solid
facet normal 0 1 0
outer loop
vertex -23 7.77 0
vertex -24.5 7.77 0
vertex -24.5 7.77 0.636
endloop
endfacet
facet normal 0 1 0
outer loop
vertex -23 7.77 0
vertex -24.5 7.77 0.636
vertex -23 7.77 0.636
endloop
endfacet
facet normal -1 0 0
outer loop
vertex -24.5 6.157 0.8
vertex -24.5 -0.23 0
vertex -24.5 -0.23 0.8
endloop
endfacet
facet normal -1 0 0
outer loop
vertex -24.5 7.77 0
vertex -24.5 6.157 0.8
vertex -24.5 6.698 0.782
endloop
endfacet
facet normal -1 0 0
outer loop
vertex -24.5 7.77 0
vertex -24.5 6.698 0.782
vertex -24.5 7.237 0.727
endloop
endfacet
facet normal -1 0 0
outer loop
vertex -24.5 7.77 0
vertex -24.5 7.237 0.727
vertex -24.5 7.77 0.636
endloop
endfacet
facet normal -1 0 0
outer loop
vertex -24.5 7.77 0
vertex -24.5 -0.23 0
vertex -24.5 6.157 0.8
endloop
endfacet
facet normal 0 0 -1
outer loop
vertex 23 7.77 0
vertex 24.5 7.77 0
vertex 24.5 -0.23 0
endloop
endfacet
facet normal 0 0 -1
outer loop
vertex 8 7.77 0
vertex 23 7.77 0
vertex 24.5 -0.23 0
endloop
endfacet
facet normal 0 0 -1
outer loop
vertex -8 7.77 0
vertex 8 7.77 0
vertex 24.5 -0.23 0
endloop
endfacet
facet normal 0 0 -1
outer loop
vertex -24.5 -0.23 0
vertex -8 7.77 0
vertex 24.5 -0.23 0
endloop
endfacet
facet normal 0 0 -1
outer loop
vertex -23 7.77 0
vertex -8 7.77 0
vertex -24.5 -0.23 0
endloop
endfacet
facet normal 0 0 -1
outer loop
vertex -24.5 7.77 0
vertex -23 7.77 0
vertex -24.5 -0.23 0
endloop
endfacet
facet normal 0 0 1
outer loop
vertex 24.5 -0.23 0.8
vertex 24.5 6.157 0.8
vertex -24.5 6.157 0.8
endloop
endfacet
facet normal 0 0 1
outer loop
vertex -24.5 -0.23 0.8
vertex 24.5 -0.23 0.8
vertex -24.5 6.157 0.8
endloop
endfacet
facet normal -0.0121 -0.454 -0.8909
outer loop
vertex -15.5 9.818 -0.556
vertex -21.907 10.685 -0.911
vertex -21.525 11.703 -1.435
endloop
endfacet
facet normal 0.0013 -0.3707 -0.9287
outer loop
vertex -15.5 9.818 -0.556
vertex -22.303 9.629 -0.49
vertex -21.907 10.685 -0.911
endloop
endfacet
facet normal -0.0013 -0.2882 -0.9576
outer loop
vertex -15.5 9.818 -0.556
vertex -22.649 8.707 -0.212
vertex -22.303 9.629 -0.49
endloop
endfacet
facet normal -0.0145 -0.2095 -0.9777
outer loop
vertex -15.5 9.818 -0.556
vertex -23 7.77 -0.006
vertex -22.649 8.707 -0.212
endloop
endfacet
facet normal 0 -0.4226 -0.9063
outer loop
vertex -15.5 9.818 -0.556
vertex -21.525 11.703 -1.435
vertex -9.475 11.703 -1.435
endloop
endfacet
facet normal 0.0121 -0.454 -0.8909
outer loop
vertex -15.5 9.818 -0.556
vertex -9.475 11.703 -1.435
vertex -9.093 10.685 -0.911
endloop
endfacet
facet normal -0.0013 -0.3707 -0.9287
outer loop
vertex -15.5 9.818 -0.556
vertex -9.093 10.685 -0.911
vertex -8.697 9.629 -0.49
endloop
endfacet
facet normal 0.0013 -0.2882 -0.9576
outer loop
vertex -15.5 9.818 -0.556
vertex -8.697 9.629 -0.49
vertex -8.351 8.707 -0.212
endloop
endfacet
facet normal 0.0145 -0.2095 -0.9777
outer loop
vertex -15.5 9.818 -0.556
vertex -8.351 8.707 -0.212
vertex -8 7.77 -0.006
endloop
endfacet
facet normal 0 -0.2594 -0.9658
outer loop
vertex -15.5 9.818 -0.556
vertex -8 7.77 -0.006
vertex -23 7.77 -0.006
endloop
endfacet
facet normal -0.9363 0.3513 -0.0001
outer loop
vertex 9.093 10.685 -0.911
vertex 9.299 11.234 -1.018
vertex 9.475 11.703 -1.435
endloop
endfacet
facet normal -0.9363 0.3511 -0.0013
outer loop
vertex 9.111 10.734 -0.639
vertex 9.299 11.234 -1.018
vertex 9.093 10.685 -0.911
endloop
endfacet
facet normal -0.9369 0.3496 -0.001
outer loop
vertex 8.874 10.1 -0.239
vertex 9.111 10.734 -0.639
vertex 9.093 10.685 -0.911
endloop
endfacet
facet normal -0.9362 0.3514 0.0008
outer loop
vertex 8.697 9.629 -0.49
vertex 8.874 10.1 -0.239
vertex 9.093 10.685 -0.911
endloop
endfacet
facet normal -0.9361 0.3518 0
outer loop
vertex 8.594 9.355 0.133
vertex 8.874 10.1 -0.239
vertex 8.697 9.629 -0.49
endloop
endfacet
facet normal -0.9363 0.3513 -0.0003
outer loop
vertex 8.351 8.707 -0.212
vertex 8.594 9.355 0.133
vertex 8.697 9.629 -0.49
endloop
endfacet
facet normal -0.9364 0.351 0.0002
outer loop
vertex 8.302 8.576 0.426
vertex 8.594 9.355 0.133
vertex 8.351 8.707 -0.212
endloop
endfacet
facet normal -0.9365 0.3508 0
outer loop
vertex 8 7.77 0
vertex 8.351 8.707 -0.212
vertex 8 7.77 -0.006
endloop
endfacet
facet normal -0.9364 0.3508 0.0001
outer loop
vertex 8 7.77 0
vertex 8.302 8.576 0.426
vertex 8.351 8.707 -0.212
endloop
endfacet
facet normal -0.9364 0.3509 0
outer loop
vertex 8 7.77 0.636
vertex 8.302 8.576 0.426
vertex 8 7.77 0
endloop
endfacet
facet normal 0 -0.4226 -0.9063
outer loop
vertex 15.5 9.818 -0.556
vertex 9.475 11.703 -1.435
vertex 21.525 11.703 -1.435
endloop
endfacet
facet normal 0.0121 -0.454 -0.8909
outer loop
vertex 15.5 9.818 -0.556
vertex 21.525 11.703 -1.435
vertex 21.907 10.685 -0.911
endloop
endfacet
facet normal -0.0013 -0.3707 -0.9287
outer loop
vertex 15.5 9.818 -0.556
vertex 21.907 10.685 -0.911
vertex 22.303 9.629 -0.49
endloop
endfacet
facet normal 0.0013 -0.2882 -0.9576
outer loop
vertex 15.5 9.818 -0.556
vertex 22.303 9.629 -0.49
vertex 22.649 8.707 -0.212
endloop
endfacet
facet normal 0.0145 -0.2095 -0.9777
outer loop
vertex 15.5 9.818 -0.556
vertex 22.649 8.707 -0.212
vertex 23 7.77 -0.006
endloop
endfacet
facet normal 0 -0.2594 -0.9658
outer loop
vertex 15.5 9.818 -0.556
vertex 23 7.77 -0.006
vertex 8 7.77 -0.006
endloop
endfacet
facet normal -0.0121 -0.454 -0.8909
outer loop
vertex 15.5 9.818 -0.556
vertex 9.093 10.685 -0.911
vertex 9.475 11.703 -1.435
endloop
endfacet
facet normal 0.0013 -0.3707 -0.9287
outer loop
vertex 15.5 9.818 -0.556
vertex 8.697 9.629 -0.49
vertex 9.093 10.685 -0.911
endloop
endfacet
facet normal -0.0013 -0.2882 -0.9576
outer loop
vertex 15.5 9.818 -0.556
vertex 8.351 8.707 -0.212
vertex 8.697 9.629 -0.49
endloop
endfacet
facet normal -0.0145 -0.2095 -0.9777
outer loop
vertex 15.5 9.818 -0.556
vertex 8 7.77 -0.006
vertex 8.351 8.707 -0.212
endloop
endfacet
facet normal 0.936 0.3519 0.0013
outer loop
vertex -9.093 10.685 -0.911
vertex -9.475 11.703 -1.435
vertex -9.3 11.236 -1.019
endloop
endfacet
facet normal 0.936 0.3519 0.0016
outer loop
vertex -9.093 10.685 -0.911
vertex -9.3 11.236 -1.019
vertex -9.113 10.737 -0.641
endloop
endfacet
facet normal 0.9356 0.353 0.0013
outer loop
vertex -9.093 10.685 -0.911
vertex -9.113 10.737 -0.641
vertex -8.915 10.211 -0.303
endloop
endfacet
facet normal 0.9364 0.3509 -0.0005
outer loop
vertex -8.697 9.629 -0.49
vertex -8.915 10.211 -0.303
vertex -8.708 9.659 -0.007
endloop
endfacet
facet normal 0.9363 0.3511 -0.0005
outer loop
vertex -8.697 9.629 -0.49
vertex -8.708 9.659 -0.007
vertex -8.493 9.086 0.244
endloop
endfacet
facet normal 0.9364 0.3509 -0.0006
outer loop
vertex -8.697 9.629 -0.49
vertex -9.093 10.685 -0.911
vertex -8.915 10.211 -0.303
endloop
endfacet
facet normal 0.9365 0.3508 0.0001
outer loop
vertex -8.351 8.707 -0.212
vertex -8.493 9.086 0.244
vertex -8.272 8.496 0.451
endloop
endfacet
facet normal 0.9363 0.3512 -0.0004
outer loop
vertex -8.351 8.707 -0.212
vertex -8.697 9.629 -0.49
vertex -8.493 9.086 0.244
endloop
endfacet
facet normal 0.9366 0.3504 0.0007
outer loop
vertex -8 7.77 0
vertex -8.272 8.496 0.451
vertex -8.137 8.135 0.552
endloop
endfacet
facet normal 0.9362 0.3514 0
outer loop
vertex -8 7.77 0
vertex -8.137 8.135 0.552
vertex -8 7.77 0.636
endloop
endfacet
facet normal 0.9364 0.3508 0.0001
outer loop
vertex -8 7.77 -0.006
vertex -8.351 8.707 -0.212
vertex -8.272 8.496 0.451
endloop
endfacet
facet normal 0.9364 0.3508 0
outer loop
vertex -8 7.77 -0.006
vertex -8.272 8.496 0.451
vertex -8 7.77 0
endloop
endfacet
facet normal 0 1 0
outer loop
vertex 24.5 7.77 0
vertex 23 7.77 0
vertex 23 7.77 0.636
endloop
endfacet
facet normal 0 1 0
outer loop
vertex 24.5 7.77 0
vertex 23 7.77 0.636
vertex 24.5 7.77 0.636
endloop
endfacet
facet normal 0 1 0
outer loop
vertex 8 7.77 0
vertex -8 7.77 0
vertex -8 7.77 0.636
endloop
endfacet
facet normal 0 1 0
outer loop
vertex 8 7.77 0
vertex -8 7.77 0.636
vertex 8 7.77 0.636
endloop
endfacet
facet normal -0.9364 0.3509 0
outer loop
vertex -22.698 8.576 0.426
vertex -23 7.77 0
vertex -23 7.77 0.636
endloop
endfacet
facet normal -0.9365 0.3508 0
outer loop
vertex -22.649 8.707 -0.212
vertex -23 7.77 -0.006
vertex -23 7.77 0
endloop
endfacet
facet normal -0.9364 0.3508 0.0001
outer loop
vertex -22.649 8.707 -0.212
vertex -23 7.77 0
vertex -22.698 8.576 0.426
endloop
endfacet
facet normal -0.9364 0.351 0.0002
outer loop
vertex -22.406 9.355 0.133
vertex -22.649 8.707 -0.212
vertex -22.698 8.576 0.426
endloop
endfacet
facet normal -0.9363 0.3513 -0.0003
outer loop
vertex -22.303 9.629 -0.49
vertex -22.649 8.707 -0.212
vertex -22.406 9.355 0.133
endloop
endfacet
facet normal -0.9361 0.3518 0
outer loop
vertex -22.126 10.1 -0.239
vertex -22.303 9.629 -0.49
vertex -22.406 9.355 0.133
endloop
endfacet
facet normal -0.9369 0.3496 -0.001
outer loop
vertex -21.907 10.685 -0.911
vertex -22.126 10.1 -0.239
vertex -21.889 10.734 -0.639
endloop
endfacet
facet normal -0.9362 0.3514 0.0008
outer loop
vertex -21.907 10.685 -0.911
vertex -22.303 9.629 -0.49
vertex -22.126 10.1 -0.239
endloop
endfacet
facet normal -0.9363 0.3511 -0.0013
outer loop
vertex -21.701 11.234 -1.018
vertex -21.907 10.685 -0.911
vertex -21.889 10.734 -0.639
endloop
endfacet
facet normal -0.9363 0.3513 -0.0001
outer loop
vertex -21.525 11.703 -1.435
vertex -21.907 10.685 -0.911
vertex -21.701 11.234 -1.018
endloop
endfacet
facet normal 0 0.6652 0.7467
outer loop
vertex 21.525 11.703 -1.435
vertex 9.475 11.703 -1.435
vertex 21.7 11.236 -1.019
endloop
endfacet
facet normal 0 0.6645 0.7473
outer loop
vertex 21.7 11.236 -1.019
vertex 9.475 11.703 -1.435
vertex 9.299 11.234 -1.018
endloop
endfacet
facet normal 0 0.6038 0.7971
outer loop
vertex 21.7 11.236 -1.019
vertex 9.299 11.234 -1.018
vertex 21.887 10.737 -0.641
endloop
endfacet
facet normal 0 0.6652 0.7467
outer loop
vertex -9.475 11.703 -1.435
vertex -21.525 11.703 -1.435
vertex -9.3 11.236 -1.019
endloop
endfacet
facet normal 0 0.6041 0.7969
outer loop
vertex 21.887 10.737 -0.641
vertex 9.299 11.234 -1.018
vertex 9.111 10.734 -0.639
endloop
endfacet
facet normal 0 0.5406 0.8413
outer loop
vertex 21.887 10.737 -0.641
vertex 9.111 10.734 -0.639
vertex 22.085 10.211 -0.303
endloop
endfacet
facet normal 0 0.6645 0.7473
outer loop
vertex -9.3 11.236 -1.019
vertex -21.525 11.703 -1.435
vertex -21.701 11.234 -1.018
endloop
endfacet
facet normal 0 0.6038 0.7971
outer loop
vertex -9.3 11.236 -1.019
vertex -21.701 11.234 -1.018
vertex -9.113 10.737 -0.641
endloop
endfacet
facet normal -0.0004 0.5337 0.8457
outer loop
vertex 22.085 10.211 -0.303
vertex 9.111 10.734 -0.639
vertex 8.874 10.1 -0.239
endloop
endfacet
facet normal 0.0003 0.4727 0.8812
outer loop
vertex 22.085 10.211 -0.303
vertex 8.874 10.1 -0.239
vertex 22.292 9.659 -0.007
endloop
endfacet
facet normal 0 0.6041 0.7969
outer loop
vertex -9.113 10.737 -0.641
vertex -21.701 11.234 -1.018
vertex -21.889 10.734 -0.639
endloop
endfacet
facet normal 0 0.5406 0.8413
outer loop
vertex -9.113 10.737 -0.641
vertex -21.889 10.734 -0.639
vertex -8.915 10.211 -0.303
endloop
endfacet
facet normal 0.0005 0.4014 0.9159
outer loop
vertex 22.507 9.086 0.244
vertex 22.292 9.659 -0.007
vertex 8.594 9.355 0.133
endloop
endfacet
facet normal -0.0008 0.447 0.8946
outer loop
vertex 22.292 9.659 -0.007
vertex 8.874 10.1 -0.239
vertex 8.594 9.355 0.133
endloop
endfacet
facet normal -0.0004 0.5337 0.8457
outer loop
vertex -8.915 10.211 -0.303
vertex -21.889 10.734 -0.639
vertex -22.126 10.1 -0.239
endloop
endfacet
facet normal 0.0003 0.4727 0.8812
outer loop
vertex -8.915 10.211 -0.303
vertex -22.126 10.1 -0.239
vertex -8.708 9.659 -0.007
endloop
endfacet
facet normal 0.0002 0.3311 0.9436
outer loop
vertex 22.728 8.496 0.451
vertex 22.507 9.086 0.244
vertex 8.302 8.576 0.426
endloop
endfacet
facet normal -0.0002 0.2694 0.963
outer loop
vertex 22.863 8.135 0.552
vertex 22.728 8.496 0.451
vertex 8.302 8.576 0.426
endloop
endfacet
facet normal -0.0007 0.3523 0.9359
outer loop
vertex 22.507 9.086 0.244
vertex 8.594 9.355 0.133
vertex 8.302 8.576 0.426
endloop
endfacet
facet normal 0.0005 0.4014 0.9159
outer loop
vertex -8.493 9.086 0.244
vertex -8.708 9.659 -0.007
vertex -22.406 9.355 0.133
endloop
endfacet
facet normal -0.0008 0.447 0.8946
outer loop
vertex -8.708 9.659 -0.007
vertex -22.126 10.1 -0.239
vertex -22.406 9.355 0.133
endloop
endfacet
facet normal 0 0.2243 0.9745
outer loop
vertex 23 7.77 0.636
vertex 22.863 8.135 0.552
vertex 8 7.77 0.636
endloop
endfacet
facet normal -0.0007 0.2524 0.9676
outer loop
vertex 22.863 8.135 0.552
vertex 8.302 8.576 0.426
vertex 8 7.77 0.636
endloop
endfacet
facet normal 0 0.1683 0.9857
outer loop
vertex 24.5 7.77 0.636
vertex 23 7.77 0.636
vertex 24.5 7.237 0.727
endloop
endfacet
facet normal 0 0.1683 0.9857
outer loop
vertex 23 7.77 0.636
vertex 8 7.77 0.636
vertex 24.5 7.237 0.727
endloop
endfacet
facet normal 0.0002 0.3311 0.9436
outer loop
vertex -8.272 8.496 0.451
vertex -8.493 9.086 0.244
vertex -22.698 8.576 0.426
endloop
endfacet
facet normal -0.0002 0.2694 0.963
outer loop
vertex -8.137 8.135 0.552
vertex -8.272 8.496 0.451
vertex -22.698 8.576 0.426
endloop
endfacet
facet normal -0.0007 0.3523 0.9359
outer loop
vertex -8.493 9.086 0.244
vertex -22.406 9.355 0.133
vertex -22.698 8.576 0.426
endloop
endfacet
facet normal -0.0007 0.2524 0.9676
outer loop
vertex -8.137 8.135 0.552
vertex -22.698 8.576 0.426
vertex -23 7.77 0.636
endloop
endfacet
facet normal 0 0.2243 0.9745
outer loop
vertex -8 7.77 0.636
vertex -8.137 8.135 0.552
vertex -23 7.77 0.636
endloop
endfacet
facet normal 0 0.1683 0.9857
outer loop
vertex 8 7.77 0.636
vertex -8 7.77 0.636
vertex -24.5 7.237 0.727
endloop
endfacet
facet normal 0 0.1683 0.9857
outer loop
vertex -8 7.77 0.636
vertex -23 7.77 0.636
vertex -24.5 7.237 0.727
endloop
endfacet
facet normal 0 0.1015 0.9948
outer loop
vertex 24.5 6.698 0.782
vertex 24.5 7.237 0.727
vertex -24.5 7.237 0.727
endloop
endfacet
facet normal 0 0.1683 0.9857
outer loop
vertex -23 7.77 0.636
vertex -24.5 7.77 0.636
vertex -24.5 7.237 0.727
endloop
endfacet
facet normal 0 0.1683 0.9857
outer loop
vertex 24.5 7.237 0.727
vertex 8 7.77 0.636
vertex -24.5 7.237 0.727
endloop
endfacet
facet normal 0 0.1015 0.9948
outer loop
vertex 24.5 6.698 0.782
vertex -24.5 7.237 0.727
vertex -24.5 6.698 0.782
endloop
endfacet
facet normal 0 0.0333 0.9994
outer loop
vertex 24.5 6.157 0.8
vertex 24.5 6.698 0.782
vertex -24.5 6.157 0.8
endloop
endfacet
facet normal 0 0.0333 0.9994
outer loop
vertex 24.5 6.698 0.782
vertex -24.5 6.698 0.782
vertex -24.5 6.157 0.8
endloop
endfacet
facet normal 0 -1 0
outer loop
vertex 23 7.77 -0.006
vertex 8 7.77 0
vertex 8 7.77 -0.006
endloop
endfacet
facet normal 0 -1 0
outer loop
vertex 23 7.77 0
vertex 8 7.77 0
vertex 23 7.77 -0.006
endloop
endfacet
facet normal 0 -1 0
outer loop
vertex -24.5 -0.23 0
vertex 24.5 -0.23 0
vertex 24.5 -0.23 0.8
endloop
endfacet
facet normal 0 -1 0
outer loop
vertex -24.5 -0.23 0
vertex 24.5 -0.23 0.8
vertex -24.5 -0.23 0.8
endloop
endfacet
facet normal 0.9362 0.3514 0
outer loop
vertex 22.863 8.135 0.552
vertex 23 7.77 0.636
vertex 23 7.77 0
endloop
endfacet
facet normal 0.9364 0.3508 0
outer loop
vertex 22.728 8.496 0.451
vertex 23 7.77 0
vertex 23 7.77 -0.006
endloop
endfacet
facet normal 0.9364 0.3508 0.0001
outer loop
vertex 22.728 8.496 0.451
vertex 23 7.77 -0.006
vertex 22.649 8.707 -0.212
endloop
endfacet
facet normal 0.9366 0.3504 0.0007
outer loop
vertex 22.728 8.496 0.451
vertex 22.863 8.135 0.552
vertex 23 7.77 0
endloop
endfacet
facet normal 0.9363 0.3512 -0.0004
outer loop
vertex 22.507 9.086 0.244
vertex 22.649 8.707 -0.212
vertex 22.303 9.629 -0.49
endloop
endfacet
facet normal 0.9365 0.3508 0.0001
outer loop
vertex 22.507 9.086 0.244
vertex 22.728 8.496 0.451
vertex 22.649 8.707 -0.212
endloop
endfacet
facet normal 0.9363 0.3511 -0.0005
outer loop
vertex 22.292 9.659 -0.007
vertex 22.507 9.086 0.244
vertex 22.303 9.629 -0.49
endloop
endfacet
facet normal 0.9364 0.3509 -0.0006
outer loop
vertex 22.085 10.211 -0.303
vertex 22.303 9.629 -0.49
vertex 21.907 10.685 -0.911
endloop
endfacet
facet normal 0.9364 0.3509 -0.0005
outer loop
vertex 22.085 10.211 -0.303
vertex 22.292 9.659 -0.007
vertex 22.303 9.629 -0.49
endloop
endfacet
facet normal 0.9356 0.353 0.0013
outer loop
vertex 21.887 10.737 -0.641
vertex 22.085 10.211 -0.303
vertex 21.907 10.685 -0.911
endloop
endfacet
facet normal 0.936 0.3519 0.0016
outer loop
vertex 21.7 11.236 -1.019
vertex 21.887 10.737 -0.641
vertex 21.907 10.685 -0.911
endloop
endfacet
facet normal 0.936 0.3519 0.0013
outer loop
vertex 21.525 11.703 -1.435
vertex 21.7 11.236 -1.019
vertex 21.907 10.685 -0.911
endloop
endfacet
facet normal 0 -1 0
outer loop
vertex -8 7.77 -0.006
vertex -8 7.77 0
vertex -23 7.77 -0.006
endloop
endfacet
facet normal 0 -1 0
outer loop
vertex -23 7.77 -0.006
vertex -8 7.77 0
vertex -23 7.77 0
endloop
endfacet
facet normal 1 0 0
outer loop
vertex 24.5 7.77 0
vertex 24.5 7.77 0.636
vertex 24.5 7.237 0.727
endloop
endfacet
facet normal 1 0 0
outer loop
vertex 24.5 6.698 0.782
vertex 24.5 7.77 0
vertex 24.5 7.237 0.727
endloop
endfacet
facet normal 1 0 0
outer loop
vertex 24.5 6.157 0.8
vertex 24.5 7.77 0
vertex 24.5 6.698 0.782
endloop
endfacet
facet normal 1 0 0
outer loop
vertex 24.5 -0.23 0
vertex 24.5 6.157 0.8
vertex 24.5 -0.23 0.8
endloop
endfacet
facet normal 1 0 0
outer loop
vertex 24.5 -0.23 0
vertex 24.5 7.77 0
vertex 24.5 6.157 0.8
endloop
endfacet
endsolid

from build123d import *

# Parameters (mm, degrees)
P_IDAT_VYSUNUT_M2_DEPTH  = 0.8
P_IDAT_VYSUNUT_M3_DEPTH  = 1.5
ZAOBLIT1_R               = 8
ODEBRAT_VYSUNUT_M3_DEPTH = 51.416211215


with BuildPart() as part:
    # Skica1 → Přidat vysunutím2 (new body)
    with BuildSketch(Plane.XY):
        Polygon((24.5, -0.229513463), (-24.5, -0.229513463), (-24.5, 7.770486537), (-23, 7.770486537), (-21.499999864, 11.770486537), (-9.499999864, 11.770486537), (-8, 7.770487265), (8, 7.770487265), (9.499999864, 11.770486537), (21.499999864, 11.770486537), (23, 7.770486537), (24.5, 7.770486537), align=None)
    extrude(amount=P_IDAT_VYSUNUT_M2_DEPTH)

    # Skica2 → Přidat vysunutím3 (add)
    with BuildSketch(Plane(origin=(0, 0, 0), x_dir=(-1, 0, 0), z_dir=(0, 0, -1))):
        Polygon((-23, 7.770486537), (-21.499999864, 11.770486537), (-9.499999864, 11.770486537), (-8, 7.770487265), align=None)
        Polygon((8, 7.770487265), (23, 7.770486537), (21.499999864, 11.770486537), (9.499999864, 11.770486537), align=None)
    extrude(amount=P_IDAT_VYSUNUT_M3_DEPTH)

    # Zaoblit1
    # the kernel refuses this fillet: 8 mm, written as the material it takes off along each edge
    with BuildSketch(Plane(origin=(-4.533442337, 11.770486537, 0.8), x_dir=(0, -1, 0), z_dir=(1, 0, 0)), Plane(origin=(-35.533442064, 11.770486537, 0.8), x_dir=(0, -1, 0), z_dir=(1, 0, 0))) as zaoblit1_piece_1:
        with BuildLine():
            CenterArc((5.61337688, 8), ZAOBLIT1_R, 225.438687956, 44.561312044)
            Line((0, 2.3), (0, 0))
            Line((0, 0), (5.61337688, 0))
        make_face()
    extrude(amount=40.066884401, mode=Mode.SUBTRACT)

    # Skica7 → Odebrat vysunutím3 (cut, through all)
    with BuildSketch(Plane(origin=(24.5, 0, 0), x_dir=(0, 0, -1), z_dir=(1, 0, 0))):
        with BuildLine():
            Line((0, 7.739922094), (1.948215566, 7.739922094))
            Line((1.948215566, 7.739922094), (1.948215566, 12.51596757))
            add(Edge.make_bspline(
                [(0, 7.739922094), (0.473258475, 10.37513305), (1.948215566, 12.51596757)],
                knots=[0, 0, 0, 1, 1, 1], degree=2))
        make_face()
    extrude(amount=-ODEBRAT_VYSUNUT_M3_DEPTH, mode=Mode.SUBTRACT)


solid = part.part
